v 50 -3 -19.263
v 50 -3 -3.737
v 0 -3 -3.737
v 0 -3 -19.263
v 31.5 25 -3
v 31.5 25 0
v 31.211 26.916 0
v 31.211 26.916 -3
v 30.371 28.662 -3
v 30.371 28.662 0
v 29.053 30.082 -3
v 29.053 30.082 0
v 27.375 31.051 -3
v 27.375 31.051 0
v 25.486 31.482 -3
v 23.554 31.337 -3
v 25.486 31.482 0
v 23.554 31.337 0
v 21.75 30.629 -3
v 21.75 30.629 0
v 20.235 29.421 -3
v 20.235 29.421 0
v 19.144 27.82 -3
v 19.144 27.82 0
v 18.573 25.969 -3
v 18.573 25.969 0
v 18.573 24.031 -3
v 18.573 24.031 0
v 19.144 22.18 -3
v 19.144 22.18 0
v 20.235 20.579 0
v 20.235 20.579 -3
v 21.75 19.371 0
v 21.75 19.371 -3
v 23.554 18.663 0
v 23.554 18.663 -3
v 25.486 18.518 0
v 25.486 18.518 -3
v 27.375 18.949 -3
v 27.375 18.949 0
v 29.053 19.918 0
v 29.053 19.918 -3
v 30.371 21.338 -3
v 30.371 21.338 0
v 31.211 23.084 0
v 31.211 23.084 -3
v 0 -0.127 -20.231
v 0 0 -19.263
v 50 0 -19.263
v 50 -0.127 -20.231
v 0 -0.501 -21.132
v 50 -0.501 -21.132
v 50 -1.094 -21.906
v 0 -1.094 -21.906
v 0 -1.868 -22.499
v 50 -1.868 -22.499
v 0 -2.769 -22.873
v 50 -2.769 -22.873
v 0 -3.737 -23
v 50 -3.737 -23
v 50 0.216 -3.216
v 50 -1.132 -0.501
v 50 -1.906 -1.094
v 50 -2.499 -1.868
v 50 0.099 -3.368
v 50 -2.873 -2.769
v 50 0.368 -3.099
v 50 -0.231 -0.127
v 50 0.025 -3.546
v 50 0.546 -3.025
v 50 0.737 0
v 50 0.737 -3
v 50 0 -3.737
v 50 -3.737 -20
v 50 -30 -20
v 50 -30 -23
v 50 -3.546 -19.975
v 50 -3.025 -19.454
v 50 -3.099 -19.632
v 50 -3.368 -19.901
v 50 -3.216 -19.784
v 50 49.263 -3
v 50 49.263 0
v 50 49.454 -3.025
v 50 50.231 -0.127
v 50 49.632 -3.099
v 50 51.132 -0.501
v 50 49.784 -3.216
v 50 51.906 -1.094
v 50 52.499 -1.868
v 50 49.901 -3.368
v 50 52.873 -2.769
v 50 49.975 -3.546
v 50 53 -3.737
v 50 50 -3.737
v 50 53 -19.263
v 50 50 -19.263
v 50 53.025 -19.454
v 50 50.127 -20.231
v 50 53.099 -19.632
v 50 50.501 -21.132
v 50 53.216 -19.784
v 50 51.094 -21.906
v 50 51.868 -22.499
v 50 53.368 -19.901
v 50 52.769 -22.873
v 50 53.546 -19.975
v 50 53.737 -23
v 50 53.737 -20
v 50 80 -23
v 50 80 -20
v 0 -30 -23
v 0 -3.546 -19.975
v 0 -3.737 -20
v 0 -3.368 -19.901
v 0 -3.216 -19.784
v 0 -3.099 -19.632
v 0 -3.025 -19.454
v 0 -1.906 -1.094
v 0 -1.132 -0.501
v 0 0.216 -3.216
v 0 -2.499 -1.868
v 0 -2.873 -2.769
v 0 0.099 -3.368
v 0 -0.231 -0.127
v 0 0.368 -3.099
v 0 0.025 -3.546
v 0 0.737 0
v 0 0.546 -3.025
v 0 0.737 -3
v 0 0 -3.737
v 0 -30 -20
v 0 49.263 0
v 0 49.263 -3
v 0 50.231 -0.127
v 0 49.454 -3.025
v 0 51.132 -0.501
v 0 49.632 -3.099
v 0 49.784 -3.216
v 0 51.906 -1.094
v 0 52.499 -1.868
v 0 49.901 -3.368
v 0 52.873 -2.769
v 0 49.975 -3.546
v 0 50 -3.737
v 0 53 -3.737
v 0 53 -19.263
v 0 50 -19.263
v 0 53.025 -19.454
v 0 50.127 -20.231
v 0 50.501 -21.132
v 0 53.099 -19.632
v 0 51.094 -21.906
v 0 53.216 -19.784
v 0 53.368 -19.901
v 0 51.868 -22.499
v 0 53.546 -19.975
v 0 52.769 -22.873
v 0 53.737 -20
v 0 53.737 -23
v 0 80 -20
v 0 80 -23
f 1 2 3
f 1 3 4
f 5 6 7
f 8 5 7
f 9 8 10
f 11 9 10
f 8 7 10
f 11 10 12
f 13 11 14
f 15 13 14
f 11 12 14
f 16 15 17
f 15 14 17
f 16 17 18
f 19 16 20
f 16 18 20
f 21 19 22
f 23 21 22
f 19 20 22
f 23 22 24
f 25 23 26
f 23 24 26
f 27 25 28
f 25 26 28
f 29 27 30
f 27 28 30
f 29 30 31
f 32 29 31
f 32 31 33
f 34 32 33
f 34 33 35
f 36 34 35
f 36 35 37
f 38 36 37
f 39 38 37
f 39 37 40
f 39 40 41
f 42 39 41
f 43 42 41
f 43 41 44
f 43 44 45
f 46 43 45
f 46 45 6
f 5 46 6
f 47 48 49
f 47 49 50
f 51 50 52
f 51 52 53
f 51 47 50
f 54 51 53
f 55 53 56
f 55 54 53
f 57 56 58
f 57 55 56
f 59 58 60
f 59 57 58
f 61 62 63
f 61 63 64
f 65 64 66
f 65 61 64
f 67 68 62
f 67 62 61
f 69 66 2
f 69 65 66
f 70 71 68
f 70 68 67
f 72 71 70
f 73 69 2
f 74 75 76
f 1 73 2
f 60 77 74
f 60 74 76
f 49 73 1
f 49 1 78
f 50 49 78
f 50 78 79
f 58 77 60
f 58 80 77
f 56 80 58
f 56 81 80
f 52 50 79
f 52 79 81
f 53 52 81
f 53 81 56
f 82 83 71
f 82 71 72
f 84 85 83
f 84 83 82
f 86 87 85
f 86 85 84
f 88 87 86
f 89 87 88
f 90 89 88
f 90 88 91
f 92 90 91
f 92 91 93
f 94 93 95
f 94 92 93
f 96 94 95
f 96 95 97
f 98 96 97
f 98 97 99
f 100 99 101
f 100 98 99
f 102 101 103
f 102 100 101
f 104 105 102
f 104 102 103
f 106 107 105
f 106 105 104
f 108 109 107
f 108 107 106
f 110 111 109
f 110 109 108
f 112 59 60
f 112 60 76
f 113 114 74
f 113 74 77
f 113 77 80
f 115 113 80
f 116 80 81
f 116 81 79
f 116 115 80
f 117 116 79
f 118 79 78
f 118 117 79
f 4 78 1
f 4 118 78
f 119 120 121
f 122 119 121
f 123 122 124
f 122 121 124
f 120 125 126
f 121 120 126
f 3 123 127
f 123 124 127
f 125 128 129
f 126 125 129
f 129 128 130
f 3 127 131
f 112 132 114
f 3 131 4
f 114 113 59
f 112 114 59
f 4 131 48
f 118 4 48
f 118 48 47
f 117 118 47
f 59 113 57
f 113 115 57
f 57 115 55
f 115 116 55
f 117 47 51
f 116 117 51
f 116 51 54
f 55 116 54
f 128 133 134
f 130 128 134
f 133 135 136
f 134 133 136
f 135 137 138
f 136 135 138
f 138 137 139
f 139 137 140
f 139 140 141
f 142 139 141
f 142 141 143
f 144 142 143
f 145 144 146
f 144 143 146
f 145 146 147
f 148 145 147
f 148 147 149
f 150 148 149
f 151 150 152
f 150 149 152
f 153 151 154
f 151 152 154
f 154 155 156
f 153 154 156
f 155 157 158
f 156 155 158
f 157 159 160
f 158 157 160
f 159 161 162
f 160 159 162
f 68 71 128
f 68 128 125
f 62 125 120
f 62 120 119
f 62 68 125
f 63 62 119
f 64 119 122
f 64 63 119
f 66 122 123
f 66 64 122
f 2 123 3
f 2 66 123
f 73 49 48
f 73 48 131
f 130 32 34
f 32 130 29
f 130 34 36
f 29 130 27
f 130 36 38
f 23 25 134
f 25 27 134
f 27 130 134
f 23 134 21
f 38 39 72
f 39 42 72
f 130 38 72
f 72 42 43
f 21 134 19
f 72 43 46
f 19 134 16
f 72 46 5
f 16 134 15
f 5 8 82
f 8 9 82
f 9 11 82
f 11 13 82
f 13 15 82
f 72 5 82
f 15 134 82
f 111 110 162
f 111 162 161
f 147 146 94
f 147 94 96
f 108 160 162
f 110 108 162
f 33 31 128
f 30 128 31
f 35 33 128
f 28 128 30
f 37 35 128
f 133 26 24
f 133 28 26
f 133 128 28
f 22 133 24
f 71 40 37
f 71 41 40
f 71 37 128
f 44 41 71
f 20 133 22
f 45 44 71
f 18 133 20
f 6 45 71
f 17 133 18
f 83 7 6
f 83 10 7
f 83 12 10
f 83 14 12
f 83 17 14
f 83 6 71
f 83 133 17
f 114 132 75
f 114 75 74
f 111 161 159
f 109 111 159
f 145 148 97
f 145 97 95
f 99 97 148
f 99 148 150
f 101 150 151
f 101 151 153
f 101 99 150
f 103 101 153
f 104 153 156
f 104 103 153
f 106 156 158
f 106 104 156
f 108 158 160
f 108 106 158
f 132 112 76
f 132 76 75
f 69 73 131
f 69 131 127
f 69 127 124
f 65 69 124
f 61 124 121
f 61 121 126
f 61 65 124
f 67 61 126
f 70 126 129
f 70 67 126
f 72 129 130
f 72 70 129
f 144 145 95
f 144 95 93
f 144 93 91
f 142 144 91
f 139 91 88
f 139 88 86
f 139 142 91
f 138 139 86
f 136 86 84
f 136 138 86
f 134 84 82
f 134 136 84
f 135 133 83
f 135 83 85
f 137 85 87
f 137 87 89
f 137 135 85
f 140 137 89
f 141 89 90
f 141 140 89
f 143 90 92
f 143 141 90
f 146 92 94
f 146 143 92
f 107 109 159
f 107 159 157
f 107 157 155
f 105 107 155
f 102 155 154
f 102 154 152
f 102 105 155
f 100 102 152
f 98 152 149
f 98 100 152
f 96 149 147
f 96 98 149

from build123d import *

# Parameters (mm, degrees)
SKETCH_1_W                         = 50
SKETCH_1_H                         = 50
SM_BASE_FLANGE_1_DEPTH             = 3
SM_EDGE_FLANGE_1_STRIP_W           = 13.4732
SM_EDGE_FLANGE_1_STRIP_H           = 3
SM_EDGE_FLANGE_1_STRIP_CUT_DEPTH   = 50
SM_EDGE_FLANGE_1_STRIP_2_W         = 13.4732
SM_EDGE_FLANGE_1_STRIP_2_H         = 3
SM_EDGE_FLANGE_1_STRIP_CUT_2_DEPTH = 50
SM_EDGE_FLANGE_1_DEPTH             = 50
SM_EDGE_FLANGE_1_BEND_DEPTH        = 50
SM_EDGE_FLANGE_2_STRIP_W           = 13.4732
SM_EDGE_FLANGE_2_STRIP_H           = 3
SM_EDGE_FLANGE_2_STRIP_CUT_DEPTH   = 50
SM_EDGE_FLANGE_2_STRIP_2_W         = 13.4732
SM_EDGE_FLANGE_2_STRIP_2_H         = 3
SM_EDGE_FLANGE_2_STRIP_CUT_2_DEPTH = 50
SM_EDGE_FLANGE_2_DEPTH             = 50
SM_EDGE_FLANGE_2_BEND_DEPTH        = 50
SKETCH_18_R                        = 6.5
CUT_EXTRUDE_1_DEPTH                = 98.103038058


# Sheet-metal steps are written as plain solids
with BuildPart() as part:
    # Sketch 1 → 基体-法兰1 (new body)
    with BuildSketch(Plane.XY):
        with Locations((25, 25)):
            Rectangle(SKETCH_1_W, SKETCH_1_H)
    extrude(amount=-SM_BASE_FLANGE_1_DEPTH)

    # 边线-法兰1 strip (across the edge) → 边线-法兰1 strip cut (cut)
    with BuildSketch(Plane(origin=(0, 50, -3), x_dir=(0, -1, 0), z_dir=(1, 0, 0))):
        with Locations((-6, -1.5)):
            Rectangle(SM_EDGE_FLANGE_1_STRIP_W, SM_EDGE_FLANGE_1_STRIP_H)
    extrude(amount=SM_EDGE_FLANGE_1_STRIP_CUT_DEPTH, mode=Mode.SUBTRACT)

    # 边线-法兰1 strip 2 (across the edge) → 边线-法兰1 strip cut 2 (cut)
    with BuildSketch(Plane(origin=(50, 0, -3), x_dir=(0, 1, 0), z_dir=(-1, 0, 0))):
        with Locations((-6, -1.5)):
            Rectangle(SM_EDGE_FLANGE_1_STRIP_2_W, SM_EDGE_FLANGE_1_STRIP_2_H)
    extrude(amount=SM_EDGE_FLANGE_1_STRIP_CUT_2_DEPTH, mode=Mode.SUBTRACT)

    # 边线-法兰1 section (across the edge) → 边线-法兰1 (add)
    with BuildSketch(Plane(origin=(0, 50, -3), x_dir=(0, -1, 0), z_dir=(1, 0, 0))):
        with BuildLine():
            Line((-3, 0.7366), (-3, 17))
            Line((-3, 17), (0, 17))
            Line((0, 17), (0, 0.7366))
            ThreePointArc((0, 0.7366), (0.215745145, 0.215745145), (0.7366, 0))
            Line((0.7366, 0), (0.7366, -3))
            ThreePointArc((0.7366, -3), (-1.905575199, -1.905575199), (-3, 0.7366))
        make_face()
    extrude(amount=SM_EDGE_FLANGE_1_DEPTH)

    # 边线-法兰1 section 2 (across the edge) → 边线-法兰1 bend (add)
    with BuildSketch(Plane(origin=(50, 0, -3), x_dir=(0, 1, 0), z_dir=(-1, 0, 0))):
        with BuildLine():
            Line((-3, 0.7366), (-3, 17))
            Line((-3, 17), (0, 17))
            Line((0, 17), (0, 0.7366))
            ThreePointArc((0, 0.7366), (0.215745145, 0.215745145), (0.7366, 0))
            Line((0.7366, 0), (0.7366, -3))
            ThreePointArc((0.7366, -3), (-1.905575199, -1.905575199), (-3, 0.7366))
        make_face()
    extrude(amount=SM_EDGE_FLANGE_1_BEND_DEPTH)

    # 边线-法兰2 strip (across the edge) → 边线-法兰2 strip cut (cut)
    with BuildSketch(Plane(origin=(0, -3, -20), x_dir=(0, 0, 1), z_dir=(1, 0, 0))):
        with Locations((-6, -1.5)):
            Rectangle(SM_EDGE_FLANGE_2_STRIP_W, SM_EDGE_FLANGE_2_STRIP_H)
    extrude(amount=SM_EDGE_FLANGE_2_STRIP_CUT_DEPTH, mode=Mode.SUBTRACT)

    # 边线-法兰2 strip 2 (across the edge) → 边线-法兰2 strip cut 2 (cut)
    with BuildSketch(Plane(origin=(50, 53, -20), x_dir=(0, 0, 1), z_dir=(-1, 0, 0))):
        with Locations((-6, -1.5)):
            Rectangle(SM_EDGE_FLANGE_2_STRIP_2_W, SM_EDGE_FLANGE_2_STRIP_2_H)
    extrude(amount=SM_EDGE_FLANGE_2_STRIP_CUT_2_DEPTH, mode=Mode.SUBTRACT)

    # 边线-法兰2 section (across the edge) → 边线-法兰2 (add)
    with BuildSketch(Plane(origin=(0, -3, -20), x_dir=(0, 0, 1), z_dir=(1, 0, 0))):
        with BuildLine():
            Line((-3, 0.7366), (-3, 27))
            Line((-3, 27), (0, 27))
            Line((0, 27), (0, 0.7366))
            ThreePointArc((0, 0.7366), (0.215745145, 0.215745145), (0.7366, 0))
            Line((0.7366, 0), (0.7366, -3))
            ThreePointArc((0.7366, -3), (-1.905575199, -1.905575199), (-3, 0.7366))
        make_face()
    extrude(amount=SM_EDGE_FLANGE_2_DEPTH)

    # 边线-法兰2 section 2 (across the edge) → 边线-法兰2 bend (add)
    with BuildSketch(Plane(origin=(50, 53, -20), x_dir=(0, 0, 1), z_dir=(-1, 0, 0))):
        with BuildLine():
            Line((-3, 0.7366), (-3, 27))
            Line((-3, 27), (0, 27))
            Line((0, 27), (0, 0.7366))
            ThreePointArc((0, 0.7366), (0.215745145, 0.215745145), (0.7366, 0))
            Line((0.7366, 0), (0.7366, -3))
            ThreePointArc((0.7366, -3), (-1.905575199, -1.905575199), (-3, 0.7366))
        make_face()
    extrude(amount=SM_EDGE_FLANGE_2_BEND_DEPTH)

    # 草图18 → 切除-拉伸1 (cut, through all)
    with BuildSketch(Plane.XY):
        with Locations((25, 25)):
            Circle(SKETCH_18_R)
    extrude(amount=-CUT_EXTRUDE_1_DEPTH, mode=Mode.SUBTRACT)


solid = part.part
